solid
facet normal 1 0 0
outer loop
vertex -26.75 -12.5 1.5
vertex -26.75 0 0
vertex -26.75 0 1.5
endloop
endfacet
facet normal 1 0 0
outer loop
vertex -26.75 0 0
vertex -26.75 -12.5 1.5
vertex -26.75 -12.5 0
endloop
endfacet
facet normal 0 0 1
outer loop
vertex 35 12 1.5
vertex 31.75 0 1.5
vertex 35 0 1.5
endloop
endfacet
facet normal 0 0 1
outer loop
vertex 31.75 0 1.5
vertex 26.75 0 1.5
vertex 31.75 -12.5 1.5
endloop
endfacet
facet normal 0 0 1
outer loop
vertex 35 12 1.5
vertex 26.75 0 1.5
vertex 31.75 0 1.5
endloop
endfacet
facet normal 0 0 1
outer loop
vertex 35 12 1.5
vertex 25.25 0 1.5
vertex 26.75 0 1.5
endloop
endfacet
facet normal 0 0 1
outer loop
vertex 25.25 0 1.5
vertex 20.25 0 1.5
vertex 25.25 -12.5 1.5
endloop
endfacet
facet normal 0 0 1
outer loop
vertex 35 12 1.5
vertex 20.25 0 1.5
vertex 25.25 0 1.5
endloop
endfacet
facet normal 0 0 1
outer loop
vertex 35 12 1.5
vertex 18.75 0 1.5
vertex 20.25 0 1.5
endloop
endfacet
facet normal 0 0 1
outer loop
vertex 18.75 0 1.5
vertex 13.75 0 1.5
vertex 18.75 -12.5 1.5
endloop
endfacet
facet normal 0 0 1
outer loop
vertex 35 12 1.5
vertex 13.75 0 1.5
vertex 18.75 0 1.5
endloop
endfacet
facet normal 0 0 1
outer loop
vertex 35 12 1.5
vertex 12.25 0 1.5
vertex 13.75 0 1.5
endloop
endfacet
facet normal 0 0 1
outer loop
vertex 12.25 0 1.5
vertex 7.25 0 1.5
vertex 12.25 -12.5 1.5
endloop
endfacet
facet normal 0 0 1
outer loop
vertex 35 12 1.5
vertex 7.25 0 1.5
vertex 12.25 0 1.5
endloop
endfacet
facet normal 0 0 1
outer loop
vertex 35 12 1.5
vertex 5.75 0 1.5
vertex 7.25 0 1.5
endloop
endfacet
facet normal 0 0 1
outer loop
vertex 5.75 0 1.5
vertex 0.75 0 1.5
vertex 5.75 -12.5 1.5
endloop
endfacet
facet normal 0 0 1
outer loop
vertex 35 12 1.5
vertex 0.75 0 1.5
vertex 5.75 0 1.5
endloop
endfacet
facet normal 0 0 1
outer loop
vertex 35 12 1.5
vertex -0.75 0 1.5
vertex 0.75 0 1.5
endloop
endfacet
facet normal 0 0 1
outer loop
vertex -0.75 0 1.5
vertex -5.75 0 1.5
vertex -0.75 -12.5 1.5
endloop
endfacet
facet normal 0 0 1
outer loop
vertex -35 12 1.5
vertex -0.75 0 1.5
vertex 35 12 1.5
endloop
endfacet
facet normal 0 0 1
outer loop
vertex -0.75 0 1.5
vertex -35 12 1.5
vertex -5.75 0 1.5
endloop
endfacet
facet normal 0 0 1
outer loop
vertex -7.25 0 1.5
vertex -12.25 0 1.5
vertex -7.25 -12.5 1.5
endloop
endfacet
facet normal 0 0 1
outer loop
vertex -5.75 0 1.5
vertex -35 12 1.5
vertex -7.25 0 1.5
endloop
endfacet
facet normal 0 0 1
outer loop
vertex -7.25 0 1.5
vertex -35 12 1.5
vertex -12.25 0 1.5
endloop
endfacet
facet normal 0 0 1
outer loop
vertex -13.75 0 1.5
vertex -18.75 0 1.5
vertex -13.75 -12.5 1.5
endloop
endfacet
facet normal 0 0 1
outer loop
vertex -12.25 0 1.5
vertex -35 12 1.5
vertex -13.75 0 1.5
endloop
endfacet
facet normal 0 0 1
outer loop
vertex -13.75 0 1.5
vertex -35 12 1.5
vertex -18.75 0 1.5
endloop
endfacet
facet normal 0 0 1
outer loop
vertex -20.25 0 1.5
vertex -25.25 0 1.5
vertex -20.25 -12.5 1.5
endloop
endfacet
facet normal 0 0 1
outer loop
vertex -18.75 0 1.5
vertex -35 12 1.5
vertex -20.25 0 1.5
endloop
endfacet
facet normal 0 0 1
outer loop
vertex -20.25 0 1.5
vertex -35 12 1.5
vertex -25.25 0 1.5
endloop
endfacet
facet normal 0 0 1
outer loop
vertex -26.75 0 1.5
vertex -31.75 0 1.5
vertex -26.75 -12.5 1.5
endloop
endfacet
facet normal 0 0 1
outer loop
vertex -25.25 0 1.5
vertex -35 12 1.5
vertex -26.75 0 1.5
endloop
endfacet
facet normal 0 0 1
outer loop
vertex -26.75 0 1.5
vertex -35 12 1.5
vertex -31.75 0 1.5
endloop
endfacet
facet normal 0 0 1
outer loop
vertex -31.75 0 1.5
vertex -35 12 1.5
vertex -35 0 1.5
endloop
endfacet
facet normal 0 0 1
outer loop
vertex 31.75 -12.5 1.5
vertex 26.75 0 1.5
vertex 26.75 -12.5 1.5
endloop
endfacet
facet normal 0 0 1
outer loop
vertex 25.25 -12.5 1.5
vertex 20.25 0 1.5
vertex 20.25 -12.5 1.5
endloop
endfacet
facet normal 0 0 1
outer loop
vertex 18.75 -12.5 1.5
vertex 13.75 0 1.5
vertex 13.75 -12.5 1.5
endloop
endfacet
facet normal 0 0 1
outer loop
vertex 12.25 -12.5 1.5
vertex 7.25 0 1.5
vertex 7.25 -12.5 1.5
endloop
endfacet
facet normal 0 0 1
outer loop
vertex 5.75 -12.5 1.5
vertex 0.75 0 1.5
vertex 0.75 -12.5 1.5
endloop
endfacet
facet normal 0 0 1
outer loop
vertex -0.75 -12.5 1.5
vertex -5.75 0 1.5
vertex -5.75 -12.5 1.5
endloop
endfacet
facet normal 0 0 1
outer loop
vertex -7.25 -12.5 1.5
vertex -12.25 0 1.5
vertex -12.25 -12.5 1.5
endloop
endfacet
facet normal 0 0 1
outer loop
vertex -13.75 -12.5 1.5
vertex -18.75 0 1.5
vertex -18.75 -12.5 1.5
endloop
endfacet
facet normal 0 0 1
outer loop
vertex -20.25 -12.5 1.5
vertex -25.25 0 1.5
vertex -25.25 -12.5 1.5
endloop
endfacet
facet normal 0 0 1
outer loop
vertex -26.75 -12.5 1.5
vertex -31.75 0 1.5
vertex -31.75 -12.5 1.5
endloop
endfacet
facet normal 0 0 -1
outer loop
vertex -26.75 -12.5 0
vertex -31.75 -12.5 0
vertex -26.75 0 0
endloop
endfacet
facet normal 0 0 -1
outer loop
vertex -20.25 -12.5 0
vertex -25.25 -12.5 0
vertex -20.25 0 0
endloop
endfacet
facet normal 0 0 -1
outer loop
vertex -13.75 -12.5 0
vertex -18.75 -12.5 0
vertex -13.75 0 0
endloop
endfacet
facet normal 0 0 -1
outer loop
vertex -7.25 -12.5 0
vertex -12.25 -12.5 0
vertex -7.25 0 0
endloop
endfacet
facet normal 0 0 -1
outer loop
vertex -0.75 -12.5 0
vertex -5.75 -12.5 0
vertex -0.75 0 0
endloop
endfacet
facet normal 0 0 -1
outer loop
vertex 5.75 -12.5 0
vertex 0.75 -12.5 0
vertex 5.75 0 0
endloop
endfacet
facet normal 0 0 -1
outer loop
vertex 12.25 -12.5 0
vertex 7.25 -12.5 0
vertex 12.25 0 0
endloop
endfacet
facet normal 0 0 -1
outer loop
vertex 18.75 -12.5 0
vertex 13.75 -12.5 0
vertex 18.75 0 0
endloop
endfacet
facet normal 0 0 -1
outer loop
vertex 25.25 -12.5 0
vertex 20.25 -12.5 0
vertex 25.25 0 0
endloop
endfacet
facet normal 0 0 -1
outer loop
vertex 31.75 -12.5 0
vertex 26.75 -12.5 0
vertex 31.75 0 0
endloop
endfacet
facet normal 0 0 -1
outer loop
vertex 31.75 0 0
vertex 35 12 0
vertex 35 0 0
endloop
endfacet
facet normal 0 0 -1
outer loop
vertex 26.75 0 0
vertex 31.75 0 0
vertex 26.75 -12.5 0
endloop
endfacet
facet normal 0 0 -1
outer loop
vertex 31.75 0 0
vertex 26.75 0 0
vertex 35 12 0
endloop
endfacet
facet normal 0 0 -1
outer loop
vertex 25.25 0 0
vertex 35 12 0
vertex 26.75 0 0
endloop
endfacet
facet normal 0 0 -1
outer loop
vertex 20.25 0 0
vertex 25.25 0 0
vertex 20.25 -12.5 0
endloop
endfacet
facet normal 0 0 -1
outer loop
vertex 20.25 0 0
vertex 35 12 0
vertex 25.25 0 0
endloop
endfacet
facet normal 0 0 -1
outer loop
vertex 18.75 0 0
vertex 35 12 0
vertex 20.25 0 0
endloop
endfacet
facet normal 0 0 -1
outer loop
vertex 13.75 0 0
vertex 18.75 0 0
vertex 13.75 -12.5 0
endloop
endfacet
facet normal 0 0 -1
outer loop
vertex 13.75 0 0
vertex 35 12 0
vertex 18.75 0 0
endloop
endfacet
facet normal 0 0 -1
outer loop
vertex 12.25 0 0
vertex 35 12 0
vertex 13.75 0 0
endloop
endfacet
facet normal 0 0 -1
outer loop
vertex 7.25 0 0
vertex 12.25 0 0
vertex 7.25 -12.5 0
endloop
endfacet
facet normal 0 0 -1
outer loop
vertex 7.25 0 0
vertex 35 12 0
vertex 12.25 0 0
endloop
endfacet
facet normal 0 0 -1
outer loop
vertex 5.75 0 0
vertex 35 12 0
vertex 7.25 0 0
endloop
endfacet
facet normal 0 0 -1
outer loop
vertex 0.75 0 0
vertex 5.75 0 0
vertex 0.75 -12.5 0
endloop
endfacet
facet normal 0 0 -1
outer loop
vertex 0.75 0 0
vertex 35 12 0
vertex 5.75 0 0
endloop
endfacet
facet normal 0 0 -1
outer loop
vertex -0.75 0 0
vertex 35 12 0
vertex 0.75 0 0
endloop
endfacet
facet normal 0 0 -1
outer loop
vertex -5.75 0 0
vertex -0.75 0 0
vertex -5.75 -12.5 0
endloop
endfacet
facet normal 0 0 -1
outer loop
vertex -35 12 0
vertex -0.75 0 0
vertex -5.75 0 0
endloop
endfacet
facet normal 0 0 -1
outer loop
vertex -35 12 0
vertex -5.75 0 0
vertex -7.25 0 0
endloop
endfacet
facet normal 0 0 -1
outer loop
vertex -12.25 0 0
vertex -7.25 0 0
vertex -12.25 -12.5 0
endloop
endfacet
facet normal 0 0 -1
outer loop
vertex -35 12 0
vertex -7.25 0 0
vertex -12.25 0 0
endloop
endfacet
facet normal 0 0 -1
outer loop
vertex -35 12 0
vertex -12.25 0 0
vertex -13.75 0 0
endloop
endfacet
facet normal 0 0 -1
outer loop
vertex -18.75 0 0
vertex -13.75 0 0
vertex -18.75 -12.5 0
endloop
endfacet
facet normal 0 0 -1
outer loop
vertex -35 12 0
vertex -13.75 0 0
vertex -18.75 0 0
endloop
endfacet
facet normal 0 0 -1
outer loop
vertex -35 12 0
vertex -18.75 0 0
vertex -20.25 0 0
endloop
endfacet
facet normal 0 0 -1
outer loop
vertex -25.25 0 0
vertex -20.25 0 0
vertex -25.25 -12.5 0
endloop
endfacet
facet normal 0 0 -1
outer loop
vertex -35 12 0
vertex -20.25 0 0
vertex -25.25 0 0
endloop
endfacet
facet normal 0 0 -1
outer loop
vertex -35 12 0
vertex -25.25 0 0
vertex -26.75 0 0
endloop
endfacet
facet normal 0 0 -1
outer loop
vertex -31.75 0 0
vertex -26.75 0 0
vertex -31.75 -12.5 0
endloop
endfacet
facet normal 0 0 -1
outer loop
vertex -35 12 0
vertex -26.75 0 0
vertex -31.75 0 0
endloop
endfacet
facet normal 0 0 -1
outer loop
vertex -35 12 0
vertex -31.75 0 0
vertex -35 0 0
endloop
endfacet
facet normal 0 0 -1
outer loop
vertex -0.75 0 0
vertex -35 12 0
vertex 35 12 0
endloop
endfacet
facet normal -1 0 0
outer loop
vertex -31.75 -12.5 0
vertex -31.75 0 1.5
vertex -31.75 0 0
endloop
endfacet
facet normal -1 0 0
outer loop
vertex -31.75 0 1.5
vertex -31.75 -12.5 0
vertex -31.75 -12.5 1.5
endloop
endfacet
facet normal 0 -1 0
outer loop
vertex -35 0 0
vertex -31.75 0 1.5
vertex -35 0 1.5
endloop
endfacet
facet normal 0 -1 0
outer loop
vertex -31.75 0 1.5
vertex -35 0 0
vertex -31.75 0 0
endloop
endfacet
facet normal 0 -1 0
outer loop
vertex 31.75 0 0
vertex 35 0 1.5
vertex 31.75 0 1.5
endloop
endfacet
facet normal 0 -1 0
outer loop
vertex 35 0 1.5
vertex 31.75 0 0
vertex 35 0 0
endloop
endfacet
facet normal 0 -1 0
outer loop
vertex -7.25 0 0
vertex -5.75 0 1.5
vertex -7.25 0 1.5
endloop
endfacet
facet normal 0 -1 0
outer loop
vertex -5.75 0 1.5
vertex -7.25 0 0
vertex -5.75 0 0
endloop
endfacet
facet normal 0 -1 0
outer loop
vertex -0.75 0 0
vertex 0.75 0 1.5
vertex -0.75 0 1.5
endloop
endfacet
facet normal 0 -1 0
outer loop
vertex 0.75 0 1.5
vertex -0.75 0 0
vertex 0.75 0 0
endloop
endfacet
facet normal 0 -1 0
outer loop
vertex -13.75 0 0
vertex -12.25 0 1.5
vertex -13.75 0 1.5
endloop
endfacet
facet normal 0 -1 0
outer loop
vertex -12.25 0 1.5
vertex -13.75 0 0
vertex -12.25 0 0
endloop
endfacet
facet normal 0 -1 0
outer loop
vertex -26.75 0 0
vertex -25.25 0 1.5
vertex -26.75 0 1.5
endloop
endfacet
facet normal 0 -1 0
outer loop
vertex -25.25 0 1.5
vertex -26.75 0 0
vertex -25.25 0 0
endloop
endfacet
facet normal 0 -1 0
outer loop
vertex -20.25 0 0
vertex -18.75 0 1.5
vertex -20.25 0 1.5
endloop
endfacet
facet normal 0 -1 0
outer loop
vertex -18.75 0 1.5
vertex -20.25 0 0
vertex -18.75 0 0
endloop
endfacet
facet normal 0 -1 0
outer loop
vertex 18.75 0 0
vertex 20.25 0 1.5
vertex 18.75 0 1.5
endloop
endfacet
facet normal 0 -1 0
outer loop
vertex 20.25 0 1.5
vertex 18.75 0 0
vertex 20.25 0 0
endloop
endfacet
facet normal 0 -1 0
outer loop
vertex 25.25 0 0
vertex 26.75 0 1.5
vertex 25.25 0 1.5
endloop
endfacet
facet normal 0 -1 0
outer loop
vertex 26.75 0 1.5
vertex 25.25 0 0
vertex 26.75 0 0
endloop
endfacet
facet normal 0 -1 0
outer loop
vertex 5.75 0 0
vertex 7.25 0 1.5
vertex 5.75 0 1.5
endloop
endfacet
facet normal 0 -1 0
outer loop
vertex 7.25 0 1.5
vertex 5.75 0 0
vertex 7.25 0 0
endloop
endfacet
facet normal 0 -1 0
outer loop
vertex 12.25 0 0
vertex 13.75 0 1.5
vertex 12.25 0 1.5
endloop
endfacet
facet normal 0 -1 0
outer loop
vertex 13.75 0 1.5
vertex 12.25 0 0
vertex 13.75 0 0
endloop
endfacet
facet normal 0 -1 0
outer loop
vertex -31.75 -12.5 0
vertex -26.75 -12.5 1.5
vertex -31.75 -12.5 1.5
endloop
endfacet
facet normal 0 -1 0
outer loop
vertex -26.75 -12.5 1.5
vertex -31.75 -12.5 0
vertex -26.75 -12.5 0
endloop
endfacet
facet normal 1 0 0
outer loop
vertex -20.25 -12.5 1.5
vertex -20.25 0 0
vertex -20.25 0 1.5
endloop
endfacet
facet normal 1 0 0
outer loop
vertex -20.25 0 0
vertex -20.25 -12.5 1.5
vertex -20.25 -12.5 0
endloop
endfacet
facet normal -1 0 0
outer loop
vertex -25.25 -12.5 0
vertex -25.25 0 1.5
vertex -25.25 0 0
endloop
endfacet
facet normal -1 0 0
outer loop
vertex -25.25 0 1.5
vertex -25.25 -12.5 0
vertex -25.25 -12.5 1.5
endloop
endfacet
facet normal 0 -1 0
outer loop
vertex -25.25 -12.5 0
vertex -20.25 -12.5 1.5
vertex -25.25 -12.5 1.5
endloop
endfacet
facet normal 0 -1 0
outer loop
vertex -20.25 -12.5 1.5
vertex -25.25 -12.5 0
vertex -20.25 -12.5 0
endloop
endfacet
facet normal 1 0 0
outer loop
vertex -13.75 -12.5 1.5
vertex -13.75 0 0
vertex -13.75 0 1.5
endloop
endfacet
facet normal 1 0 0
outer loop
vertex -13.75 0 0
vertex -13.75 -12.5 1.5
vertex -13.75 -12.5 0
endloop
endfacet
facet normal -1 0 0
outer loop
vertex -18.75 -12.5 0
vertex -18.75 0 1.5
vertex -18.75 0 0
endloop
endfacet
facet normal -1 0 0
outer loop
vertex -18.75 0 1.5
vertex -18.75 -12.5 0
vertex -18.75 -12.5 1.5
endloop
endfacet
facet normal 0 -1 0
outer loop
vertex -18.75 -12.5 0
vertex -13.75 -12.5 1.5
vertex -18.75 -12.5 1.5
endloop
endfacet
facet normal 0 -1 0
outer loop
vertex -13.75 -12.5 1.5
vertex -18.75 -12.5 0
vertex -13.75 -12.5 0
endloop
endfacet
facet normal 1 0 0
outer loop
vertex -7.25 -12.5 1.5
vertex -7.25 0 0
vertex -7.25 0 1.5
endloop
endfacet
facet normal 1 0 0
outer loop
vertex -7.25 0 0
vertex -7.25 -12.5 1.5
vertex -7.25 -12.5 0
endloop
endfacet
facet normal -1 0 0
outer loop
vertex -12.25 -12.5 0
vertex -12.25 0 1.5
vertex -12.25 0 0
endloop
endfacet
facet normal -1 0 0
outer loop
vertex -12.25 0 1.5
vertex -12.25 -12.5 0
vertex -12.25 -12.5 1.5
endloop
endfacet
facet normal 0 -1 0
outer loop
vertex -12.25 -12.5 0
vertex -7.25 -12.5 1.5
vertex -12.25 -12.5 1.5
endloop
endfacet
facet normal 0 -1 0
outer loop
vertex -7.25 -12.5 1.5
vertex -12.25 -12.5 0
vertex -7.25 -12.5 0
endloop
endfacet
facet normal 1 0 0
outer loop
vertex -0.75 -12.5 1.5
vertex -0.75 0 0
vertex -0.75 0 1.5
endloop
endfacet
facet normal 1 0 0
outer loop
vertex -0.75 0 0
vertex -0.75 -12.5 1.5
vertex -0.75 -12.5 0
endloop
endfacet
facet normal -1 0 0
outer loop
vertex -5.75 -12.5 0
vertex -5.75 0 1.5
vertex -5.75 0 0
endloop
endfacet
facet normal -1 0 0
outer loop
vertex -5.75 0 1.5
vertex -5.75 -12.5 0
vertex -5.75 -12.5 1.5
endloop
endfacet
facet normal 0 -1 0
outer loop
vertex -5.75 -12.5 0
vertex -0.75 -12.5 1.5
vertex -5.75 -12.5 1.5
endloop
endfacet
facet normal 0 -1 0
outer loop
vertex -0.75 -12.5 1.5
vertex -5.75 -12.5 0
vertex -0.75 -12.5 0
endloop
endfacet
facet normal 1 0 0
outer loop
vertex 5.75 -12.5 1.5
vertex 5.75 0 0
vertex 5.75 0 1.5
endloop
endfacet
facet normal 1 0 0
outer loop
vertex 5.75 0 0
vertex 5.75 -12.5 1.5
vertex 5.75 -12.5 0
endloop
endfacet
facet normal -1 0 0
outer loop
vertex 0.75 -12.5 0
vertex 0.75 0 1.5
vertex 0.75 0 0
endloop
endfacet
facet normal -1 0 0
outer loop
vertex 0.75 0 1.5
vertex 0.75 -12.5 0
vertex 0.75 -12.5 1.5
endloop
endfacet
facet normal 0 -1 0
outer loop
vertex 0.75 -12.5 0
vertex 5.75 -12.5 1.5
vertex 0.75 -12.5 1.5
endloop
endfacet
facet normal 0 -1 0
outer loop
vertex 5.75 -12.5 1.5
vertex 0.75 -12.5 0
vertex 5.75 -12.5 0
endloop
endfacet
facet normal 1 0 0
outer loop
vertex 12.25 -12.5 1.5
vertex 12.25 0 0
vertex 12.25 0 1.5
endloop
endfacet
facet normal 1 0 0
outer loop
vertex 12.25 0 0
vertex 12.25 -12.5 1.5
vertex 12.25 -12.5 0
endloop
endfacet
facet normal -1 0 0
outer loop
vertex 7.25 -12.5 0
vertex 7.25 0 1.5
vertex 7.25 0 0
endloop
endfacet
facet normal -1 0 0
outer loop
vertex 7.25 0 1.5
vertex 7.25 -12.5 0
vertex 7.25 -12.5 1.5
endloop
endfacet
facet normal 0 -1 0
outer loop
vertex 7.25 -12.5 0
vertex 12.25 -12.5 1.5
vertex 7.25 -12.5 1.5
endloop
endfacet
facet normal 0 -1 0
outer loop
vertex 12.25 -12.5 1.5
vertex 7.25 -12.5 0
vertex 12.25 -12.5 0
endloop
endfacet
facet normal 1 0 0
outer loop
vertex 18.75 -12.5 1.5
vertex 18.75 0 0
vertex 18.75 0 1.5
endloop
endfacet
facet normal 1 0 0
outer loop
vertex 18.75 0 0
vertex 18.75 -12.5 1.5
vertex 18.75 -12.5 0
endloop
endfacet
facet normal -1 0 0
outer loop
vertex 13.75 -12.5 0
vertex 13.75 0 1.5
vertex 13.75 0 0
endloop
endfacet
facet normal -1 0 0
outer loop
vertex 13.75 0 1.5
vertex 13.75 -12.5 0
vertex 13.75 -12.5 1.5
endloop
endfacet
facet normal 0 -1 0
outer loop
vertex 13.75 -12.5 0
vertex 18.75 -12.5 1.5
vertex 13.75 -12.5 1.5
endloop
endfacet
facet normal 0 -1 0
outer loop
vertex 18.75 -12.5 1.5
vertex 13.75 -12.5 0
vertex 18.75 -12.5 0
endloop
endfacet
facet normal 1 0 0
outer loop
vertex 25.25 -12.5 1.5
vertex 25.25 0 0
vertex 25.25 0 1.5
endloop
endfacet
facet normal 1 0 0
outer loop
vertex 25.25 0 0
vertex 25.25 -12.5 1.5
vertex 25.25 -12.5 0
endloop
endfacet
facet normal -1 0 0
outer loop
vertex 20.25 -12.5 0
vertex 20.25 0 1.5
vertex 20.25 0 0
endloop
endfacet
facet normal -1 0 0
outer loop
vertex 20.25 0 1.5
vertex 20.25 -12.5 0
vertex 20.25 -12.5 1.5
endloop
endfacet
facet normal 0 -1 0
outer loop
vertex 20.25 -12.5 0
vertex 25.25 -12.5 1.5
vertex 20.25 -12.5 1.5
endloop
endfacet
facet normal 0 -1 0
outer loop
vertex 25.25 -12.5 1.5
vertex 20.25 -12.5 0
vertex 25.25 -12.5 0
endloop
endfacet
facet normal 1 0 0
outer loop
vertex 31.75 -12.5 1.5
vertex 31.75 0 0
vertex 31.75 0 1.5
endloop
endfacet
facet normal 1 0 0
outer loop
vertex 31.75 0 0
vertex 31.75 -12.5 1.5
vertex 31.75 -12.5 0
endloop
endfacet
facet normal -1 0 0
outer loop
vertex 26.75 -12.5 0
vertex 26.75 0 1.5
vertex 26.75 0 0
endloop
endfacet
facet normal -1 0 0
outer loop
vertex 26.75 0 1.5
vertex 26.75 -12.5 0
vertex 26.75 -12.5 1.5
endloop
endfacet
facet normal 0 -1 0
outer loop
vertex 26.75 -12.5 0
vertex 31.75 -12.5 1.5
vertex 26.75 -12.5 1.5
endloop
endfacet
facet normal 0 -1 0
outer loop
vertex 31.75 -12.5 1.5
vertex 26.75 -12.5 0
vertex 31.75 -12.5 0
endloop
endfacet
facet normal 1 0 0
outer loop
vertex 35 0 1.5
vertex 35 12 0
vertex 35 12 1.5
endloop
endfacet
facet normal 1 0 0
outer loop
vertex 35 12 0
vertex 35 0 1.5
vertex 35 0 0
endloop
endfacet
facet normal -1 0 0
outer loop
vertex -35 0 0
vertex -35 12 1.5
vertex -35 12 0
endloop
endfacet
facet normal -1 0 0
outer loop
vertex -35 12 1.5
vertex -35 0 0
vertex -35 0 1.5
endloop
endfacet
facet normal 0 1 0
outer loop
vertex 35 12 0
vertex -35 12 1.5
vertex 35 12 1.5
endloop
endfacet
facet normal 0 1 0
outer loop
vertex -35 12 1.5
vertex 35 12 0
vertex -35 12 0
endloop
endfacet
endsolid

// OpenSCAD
// 10-well comb for agarose gel casting, printed lying flat
// Units: mm

// ---- Spine ----
spine_len   = 70;   // spine length along X
spine_wid   = 12;   // spine width along Y

// ---- Teeth ----
tooth_count = 10;   // number of wells
tooth_w     = 5.0;  // tooth width along X
tooth_l     = 12;   // tooth length along Y (overlaps spine)

// ---- Gaps ----
gap         = 1.5;  // gap between neighbouring teeth

// ---- Plate ----
plate_t     = 1.5;  // plate thickness along Z

// ---- Misc ----
eps         = 0.5;  // cutter overshoot past faces

$fn = 64;

// Pitch between tooth centres
pitch = tooth_w + gap;

// X offset of first tooth so the row is centred on the spine
row_start = -(tooth_count - 1) * pitch / 2;

union() {
    // Spine (back bar)
    translate([-spine_len / 2, 0, 0])
        cube([spine_len, spine_wid, plate_t]);

    // Teeth hanging in -Y direction
    for (i = [0 : tooth_count - 1]) {
        translate([row_start + i * pitch - tooth_w / 2,
                   -spine_wid - eps,
                   0])
            cube([tooth_w, tooth_l + eps, plate_t]);
    }
}
